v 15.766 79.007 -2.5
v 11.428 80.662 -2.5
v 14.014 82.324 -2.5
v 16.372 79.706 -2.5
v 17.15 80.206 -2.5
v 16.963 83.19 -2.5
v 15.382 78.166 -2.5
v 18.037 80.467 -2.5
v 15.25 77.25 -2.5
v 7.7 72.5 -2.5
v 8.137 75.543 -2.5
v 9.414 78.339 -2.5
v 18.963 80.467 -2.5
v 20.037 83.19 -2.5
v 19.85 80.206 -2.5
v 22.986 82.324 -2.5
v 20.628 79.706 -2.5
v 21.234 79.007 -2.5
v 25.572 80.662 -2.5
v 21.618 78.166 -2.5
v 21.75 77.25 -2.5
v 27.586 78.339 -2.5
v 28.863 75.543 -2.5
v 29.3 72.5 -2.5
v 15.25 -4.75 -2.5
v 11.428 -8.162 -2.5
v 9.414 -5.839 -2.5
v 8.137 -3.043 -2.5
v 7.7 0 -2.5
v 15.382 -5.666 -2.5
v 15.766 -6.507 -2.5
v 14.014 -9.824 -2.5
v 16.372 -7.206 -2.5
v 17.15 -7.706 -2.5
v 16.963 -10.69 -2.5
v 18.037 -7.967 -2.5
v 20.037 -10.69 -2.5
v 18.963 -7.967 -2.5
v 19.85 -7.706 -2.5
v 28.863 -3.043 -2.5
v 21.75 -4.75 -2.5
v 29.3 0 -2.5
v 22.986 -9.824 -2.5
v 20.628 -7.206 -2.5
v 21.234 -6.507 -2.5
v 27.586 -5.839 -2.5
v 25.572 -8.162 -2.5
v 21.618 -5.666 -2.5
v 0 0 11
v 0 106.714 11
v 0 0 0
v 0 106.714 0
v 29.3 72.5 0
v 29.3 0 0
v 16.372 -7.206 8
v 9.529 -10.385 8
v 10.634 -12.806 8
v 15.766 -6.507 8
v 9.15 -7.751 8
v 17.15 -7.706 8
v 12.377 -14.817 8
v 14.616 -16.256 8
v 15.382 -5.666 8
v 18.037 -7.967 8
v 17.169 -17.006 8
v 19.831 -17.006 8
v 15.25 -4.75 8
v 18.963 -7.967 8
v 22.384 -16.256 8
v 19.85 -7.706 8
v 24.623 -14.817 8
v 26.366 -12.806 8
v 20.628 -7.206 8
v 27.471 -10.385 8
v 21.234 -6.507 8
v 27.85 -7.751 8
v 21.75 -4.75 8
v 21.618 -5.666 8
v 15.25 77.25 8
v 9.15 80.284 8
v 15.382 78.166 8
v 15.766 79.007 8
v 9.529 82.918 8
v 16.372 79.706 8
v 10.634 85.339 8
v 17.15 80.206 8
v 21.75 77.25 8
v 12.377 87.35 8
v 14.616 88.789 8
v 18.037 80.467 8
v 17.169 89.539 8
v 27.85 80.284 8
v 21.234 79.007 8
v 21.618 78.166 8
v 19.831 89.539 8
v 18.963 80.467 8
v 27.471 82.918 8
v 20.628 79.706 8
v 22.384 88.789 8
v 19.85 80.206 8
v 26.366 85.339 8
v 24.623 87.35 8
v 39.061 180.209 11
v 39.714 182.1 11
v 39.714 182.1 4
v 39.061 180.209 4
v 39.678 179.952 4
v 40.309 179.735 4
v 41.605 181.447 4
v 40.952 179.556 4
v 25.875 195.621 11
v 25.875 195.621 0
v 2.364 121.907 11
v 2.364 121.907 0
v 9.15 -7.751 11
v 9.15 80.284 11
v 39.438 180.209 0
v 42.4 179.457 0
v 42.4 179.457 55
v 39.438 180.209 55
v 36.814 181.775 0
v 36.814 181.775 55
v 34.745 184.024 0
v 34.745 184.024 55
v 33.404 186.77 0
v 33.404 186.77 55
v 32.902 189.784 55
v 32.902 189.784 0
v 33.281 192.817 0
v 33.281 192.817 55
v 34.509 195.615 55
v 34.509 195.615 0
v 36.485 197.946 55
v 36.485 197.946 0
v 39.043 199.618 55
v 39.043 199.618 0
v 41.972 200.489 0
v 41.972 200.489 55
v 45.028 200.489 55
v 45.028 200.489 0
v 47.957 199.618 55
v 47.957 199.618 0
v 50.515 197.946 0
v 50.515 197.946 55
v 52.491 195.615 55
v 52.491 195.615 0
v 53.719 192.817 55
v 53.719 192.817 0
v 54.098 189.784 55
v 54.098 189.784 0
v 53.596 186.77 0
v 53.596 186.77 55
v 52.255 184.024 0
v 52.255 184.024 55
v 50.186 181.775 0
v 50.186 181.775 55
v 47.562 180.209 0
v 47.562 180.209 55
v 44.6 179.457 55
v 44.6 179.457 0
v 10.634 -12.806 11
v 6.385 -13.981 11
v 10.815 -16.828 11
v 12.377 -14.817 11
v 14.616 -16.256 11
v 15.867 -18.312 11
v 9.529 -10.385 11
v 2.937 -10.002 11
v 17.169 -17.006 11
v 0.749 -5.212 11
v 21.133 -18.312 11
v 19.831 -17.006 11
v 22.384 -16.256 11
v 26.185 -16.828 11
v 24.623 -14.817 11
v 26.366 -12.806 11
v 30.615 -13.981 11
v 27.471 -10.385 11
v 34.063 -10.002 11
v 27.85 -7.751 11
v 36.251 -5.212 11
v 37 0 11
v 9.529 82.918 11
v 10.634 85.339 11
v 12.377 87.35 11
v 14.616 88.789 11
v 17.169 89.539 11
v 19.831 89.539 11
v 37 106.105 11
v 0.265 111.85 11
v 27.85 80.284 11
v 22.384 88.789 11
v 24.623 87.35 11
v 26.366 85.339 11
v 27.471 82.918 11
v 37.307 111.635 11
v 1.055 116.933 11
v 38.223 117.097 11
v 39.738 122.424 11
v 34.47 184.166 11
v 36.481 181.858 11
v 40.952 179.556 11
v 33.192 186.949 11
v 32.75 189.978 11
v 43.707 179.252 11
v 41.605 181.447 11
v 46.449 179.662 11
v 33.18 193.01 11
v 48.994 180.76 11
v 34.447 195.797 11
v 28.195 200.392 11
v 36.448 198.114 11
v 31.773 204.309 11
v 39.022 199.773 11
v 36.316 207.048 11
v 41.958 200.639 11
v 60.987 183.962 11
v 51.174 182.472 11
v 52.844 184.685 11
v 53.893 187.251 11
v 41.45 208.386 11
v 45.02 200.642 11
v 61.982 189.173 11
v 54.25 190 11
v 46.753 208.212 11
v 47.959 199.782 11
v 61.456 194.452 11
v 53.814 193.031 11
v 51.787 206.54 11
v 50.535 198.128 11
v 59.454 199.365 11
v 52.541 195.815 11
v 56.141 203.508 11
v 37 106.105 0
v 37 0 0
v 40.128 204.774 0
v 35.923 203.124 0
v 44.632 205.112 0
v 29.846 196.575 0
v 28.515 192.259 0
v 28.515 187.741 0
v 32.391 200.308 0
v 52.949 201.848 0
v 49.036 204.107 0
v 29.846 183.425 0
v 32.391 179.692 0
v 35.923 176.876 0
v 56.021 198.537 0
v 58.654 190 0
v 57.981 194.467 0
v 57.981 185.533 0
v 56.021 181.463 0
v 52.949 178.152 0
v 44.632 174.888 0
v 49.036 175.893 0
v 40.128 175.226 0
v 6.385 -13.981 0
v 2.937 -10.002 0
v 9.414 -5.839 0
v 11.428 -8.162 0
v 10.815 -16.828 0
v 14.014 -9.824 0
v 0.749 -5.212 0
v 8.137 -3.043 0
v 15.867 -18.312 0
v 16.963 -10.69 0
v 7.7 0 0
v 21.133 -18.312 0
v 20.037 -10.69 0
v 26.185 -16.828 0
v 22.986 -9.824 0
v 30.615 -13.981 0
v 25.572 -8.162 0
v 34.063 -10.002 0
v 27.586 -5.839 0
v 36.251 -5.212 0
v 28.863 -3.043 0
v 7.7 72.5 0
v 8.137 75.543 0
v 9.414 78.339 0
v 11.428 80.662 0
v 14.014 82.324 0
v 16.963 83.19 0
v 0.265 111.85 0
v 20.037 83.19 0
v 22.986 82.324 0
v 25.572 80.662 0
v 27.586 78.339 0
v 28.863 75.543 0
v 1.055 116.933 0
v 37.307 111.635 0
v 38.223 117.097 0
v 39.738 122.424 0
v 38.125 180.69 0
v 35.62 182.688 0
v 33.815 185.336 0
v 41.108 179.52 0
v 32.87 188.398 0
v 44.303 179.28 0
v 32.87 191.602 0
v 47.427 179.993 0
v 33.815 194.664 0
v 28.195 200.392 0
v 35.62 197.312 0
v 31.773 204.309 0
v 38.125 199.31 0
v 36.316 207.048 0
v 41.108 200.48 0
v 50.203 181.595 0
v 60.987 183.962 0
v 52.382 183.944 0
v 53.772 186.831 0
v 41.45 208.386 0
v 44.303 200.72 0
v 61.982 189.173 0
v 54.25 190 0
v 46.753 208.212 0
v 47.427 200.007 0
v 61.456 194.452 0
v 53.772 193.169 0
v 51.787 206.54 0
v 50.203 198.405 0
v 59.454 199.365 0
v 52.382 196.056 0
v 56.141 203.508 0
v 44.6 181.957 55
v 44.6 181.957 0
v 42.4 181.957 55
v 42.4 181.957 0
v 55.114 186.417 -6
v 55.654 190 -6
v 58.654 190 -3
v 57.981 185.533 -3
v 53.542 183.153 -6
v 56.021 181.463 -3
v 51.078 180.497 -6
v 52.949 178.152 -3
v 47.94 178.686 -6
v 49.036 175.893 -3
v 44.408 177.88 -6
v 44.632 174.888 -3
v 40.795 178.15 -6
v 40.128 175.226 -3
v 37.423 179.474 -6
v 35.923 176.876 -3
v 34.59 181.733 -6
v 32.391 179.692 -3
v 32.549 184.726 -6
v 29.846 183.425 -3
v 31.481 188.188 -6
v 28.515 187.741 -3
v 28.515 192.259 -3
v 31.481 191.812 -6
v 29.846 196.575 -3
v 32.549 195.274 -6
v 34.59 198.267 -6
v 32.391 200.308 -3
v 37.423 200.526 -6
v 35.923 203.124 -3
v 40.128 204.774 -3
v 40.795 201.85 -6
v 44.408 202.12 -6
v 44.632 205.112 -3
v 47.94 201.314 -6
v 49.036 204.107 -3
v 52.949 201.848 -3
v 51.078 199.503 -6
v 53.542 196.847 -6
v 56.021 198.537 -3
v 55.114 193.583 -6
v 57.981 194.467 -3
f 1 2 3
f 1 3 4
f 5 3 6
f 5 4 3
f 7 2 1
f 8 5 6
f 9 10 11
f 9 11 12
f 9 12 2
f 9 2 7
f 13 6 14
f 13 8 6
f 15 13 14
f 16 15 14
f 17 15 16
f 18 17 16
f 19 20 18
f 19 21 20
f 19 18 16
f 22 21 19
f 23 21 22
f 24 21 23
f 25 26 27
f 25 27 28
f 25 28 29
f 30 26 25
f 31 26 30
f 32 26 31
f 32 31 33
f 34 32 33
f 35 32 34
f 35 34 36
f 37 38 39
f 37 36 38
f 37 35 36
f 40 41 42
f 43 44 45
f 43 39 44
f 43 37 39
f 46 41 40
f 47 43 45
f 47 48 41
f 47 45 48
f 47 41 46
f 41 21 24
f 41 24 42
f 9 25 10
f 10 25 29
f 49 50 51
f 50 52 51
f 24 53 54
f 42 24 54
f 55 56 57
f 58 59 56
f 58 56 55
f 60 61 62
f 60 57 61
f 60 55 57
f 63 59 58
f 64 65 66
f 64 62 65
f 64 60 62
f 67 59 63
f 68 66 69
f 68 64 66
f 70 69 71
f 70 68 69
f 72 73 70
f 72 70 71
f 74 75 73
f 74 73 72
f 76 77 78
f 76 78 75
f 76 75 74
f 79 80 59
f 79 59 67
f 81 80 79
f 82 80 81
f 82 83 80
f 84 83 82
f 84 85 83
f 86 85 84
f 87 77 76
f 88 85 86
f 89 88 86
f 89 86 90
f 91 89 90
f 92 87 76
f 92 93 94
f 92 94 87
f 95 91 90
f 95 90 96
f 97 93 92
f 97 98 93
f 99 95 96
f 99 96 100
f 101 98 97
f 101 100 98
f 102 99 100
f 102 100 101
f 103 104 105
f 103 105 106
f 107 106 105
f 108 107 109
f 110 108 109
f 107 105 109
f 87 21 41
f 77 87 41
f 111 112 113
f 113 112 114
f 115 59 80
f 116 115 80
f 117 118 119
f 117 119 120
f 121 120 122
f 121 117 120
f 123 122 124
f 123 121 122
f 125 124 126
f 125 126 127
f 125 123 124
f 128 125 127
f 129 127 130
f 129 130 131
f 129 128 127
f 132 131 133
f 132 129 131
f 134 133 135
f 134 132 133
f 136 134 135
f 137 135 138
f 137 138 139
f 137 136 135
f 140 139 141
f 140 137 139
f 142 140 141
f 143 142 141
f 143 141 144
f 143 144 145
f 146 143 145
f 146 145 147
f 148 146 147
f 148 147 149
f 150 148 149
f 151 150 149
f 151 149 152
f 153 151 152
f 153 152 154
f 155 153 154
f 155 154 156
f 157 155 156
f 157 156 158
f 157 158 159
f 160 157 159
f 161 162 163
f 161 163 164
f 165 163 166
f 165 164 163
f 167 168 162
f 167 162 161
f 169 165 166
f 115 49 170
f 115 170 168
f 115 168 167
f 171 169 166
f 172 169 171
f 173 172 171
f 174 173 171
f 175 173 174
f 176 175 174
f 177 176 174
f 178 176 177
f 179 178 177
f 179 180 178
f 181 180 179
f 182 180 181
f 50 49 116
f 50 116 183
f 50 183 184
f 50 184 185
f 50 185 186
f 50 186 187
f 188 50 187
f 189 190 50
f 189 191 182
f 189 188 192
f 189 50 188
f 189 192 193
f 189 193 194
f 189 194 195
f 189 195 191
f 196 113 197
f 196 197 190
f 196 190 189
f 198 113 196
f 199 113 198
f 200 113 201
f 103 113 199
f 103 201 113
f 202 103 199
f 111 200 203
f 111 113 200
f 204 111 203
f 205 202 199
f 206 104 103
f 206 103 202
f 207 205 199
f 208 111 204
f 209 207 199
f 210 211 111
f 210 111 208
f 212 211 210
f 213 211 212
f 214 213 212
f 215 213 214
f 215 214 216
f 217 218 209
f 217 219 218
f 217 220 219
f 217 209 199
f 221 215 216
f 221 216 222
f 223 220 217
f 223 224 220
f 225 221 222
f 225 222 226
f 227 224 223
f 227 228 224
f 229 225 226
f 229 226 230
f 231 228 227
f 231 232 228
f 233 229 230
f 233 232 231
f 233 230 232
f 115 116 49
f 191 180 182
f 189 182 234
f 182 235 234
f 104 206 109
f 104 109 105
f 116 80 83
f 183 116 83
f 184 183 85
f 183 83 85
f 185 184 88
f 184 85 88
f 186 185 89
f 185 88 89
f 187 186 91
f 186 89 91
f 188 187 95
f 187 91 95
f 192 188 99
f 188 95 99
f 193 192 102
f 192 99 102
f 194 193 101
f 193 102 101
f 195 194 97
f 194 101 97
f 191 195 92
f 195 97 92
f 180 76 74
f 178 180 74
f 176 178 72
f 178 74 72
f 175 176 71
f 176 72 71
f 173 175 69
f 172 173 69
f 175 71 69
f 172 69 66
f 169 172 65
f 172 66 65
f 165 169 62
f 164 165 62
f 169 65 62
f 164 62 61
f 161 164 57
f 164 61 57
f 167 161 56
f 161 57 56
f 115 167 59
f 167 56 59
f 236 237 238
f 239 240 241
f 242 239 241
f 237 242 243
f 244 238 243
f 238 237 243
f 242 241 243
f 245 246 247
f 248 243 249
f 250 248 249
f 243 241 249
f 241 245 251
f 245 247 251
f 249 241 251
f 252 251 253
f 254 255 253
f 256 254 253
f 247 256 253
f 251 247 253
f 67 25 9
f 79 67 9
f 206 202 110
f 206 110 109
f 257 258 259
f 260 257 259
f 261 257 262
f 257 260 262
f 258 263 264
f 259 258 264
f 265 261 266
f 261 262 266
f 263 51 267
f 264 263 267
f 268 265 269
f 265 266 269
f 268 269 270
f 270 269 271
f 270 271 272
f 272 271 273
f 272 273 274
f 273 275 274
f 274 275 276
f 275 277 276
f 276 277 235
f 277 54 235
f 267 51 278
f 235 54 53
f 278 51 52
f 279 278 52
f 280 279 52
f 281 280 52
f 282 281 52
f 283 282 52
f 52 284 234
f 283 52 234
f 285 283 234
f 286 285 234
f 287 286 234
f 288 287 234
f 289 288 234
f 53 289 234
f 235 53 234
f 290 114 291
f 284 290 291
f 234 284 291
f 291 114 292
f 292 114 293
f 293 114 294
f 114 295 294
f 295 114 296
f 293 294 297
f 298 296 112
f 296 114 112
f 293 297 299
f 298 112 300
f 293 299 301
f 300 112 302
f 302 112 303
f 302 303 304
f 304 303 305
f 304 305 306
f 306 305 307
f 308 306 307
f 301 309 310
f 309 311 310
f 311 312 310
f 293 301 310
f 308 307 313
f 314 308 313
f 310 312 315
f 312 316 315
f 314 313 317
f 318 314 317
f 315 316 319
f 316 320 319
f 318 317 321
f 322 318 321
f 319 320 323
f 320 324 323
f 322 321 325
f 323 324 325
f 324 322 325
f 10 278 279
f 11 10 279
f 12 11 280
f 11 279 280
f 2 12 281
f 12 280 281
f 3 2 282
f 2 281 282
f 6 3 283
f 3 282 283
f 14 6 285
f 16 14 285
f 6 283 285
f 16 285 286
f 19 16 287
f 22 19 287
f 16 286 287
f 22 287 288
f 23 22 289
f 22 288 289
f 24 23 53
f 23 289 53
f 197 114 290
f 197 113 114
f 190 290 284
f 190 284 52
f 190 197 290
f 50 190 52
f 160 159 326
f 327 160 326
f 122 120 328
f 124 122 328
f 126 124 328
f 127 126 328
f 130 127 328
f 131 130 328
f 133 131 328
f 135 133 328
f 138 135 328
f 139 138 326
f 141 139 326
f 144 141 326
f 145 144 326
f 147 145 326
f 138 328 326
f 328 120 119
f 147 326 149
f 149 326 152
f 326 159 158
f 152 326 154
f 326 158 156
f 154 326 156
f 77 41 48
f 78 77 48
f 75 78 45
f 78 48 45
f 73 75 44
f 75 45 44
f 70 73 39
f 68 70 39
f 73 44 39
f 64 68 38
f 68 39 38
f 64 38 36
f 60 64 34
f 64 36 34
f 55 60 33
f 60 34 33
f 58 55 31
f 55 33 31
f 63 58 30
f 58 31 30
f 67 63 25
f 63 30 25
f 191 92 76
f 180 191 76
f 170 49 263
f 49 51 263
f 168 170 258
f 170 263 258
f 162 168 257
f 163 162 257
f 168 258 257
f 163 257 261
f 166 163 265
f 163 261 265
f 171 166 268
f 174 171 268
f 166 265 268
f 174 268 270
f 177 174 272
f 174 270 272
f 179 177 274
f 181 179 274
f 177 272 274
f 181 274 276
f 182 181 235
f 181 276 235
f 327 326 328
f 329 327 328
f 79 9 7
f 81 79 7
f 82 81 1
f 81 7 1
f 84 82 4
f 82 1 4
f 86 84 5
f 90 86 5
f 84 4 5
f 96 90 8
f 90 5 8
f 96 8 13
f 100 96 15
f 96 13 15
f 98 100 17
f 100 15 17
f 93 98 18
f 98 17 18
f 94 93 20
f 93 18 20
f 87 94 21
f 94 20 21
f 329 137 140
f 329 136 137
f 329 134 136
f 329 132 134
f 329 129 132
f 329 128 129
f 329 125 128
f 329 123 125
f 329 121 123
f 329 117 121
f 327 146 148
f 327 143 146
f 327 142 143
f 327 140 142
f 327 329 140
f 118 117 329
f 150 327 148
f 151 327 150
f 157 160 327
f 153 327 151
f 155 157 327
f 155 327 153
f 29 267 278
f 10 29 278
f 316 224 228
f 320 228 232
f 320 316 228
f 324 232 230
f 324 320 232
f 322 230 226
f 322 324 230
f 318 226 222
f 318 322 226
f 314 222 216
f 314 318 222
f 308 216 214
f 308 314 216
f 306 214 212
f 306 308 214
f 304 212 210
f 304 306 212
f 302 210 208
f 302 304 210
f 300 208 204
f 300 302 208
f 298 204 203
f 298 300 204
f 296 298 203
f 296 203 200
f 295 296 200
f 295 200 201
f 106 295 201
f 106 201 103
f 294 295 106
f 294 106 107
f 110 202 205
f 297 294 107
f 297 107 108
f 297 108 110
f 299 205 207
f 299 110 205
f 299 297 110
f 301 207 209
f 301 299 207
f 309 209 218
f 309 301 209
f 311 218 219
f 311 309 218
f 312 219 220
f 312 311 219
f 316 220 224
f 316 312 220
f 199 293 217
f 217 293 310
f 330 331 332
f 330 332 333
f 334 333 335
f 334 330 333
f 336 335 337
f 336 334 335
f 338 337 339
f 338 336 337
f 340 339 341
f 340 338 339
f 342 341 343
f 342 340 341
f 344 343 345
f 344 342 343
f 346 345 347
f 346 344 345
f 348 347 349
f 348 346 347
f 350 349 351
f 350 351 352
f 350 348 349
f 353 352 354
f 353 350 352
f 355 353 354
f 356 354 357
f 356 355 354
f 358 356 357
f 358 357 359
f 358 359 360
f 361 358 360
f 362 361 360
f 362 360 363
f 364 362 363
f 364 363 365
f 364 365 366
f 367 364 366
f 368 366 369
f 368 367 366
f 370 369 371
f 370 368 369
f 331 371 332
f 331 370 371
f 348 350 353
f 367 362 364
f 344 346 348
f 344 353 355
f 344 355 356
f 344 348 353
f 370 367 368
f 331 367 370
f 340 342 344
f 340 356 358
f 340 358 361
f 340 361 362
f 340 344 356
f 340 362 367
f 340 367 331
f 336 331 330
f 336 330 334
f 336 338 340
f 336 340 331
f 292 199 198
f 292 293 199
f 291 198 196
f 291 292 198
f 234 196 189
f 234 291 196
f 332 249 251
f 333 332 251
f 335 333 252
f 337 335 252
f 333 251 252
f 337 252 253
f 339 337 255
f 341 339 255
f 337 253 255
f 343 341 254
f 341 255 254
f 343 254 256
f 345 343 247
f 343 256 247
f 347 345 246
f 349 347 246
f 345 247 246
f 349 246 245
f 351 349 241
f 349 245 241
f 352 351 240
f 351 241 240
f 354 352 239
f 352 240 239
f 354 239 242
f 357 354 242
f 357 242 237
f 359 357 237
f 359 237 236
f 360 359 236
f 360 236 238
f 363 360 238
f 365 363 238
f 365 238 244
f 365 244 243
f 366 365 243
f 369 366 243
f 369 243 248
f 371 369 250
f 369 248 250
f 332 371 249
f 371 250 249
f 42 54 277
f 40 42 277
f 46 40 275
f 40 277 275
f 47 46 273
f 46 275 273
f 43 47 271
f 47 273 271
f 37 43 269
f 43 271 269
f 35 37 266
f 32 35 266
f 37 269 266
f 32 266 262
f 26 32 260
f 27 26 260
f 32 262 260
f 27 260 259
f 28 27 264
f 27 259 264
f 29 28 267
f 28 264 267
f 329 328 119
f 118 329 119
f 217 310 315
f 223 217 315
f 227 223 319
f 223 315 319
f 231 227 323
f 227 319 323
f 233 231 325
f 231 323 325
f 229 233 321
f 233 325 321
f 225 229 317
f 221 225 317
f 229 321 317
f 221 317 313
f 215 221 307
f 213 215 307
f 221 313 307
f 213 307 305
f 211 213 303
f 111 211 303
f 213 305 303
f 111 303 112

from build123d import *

# Parameters (mm, degrees)
F0_R      = 10.75
F1_DEPTH  = 8
F3_DEPTH  = 2.5
F5_DEPTH  = 25
F6_R      = 10.75
F7_DEPTH  = 3
F9_DEPTH  = 7
F10_R     = 50
F11_R     = 10.6
F12_DEPTH = 55
F13_R     = 15.154326
F14_DEPTH = 6
F15_SIZE  = 3
F17_DEPTH = 55


with BuildPart() as f1:
    # F0 (on Top) → F1 (new body)
    with BuildSketch(Plane.XY):
        with BuildLine():
            Line((0, 114.4941), (0, 0))
            ThreePointArc((0, 0), (18.5, -18.5), (37, 0))
            Line((37, 0), (37, 114.4941))
            Line((37, 114.4941), (60.986879, 183.961866))
            ThreePointArc((60.986879, 183.961866), (49.330178, 207.557307), (25.874738, 195.6214))
            Line((25.874738, 195.6214), (0, 114.4941))
        make_face()
        with Locations((43.5, 190)):
            Circle(F0_R, mode=Mode.SUBTRACT)
    extrude(amount=F1_DEPTH)

    # F2 (on face) → F3 (join)
    with BuildSketch(Plane(origin=(0, 0, 0), x_dir=(1, 0, 0), z_dir=(0, 0, -1))):
        with BuildLine():
            ThreePointArc((29.3, 0), (18.5, 10.8), (7.7, 0))
            Line((7.7, 0), (7.7, -72.5))
            ThreePointArc((7.7, -72.5), (18.5, -83.3), (29.3, -72.5))
            Line((29.3, -72.5), (29.3, 0))
        make_face()
    extrude(amount=F3_DEPTH)

    # F4 (on face) → F5 (cut)
    with BuildSketch(Plane(origin=(0, 0, -2.5), x_dir=(1, 0, 0), z_dir=(0, 0, -1))):
        with BuildLine():
            ThreePointArc((21.75, 4.75), (18.5, 8), (15.25, 4.75))
            Line((15.25, 4.75), (15.25, -77.25))
            ThreePointArc((15.25, -77.25), (18.5, -80.5), (21.75, -77.25))
            Line((21.75, -77.25), (21.75, 4.75))
        make_face()
    extrude(amount=-F5_DEPTH, mode=Mode.SUBTRACT)

    # F6 (on face) → F7 (join)
    with BuildSketch(Plane.XY.offset(8)):
        with BuildLine():
            Line((25.874738, 195.6214), (0, 114.4941))
            Line((0, 114.4941), (0, 0))
            ThreePointArc((0, 0), (18.5, -18.5), (37, 0))
            Line((37, 0), (37, 114.4941))
            Line((37, 114.4941), (60.986879, 183.961866))
            ThreePointArc((60.986879, 183.961866), (49.330178, 207.557307), (25.874738, 195.6214))
        make_face()
        with BuildLine():
            Line((9.15, -7.750917), (9.15, 80.283705))
            ThreePointArc((9.15, 80.283705), (18.5, 89.633705), (27.85, 80.283705))
            Line((27.85, 80.283705), (27.85, -7.750917))
            ThreePointArc((27.85, -7.750917), (18.5, -17.100917), (9.15, -7.750917))
        make_face(mode=Mode.SUBTRACT)
        with Locations((43.5, 190)):
            Circle(F6_R, mode=Mode.SUBTRACT)
    extrude(amount=F7_DEPTH)

    # F8 (on face) → F9 (join)
    with BuildSketch(Plane.XY.offset(11)):
        with BuildLine():
            Line((39.714103, 182.099624), (39.061332, 180.209151))
            ThreePointArc((39.061332, 180.209151), (39.991329, 179.838631), (40.951805, 179.55638))
            Line((40.951805, 179.55638), (41.604576, 181.446853))
            Line((41.604576, 181.446853), (39.714103, 182.099624))
        make_face()
    extrude(amount=-F9_DEPTH)

    # F10
    f10_edges = [f1.edges().sort_by_distance(p)[0] for p in [
        (0, 114.4941, 5.5),
        (37, 114.4941, 5.5),
    ]]
    fillet(f10_edges, radius=F10_R)


with BuildPart() as f12:
    # F11 (on face) → F12 (new body)
    with BuildSketch(Plane(origin=(0, 0, 0), x_dir=(1, 0, 0), z_dir=(0, 0, -1))):
        with Locations((43.5, -190)):
            Circle(F11_R)
    extrude(amount=-F12_DEPTH)

    # F16 (on face) → F17 (cut)
    with BuildSketch(Plane.XY.offset(55)):
        with BuildLine():
            Line((44.6, 181.95723), (42.4, 181.95723))
            Line((42.4, 181.95723), (42.4, 179.45723))
            ThreePointArc((42.4, 179.45723), (43.5, 179.4), (44.6, 179.45723))
            Line((44.6, 179.45723), (44.6, 181.95723))
        make_face()
    extrude(amount=-F17_DEPTH, mode=Mode.SUBTRACT)


with BuildPart() as f14:
    # F13 (on face) → F14 (new body)
    with BuildSketch(Plane(origin=(0, 0, 0), x_dir=(1, 0, 0), z_dir=(0, 0, -1))):
        with Locations((43.5, -190)):
            Circle(F13_R)
    extrude(amount=F14_DEPTH)

    # F15
    f15_edges = [f14.edges().sort_by_distance(p)[0] for p in [
        (28.345674, 190, -6),
    ]]
    chamfer(f15_edges, length=F15_SIZE)


solid = Compound([f1.part, f12.part, f14.part])
